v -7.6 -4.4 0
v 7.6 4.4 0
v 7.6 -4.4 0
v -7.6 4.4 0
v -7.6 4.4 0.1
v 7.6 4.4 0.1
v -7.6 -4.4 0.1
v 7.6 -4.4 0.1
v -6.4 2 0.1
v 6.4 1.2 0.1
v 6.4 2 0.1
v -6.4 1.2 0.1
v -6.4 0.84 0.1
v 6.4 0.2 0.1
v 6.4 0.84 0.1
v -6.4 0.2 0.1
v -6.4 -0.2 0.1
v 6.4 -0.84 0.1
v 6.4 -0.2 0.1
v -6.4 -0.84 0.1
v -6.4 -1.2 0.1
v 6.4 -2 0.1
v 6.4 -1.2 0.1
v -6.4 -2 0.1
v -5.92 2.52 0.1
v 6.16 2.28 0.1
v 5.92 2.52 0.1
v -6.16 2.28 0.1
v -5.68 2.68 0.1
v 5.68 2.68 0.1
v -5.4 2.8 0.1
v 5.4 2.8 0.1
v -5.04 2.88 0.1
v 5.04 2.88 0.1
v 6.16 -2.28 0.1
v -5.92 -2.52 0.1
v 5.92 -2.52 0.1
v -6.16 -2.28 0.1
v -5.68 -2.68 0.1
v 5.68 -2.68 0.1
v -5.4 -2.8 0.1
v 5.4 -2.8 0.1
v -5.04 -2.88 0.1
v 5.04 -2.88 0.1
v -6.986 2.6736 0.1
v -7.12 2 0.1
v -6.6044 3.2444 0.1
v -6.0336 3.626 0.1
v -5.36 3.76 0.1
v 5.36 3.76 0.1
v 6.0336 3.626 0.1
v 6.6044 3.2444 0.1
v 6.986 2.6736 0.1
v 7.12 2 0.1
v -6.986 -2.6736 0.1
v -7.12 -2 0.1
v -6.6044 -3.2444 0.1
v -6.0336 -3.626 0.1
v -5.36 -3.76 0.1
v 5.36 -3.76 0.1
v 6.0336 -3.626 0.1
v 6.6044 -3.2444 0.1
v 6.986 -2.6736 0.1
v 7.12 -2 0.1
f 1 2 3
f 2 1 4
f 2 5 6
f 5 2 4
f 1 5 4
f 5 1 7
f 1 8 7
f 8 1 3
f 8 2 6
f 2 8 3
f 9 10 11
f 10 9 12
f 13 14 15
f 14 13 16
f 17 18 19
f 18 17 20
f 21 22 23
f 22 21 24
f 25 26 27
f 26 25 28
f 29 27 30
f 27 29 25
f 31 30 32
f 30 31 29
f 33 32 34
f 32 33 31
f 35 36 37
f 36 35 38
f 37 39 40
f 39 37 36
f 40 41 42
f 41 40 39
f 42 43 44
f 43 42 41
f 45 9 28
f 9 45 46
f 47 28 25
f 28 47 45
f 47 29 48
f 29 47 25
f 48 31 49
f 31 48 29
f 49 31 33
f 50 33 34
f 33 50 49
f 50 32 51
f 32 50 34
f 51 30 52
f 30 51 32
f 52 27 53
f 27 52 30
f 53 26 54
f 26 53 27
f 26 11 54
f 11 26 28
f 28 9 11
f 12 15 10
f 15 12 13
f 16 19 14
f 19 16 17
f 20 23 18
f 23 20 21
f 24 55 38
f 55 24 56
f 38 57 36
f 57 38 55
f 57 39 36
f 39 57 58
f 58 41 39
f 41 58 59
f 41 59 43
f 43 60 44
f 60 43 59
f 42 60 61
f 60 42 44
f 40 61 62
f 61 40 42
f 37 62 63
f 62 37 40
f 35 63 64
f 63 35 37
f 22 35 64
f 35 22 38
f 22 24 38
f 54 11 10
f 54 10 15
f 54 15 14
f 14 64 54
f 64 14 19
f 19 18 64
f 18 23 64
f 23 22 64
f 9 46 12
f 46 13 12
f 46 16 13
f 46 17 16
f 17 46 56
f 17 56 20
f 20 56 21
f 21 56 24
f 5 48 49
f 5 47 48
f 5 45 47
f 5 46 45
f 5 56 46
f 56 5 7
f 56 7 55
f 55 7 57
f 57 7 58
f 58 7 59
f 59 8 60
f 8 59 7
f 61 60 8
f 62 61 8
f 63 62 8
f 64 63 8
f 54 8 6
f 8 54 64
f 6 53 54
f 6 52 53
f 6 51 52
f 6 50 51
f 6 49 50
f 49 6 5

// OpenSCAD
// file: ../p/box5-12.scad
use <../lib.scad>
function ldraw_lib__box5_12() = [
// 0 Box with 5 Faces without Any Edges
// 0 Name: box5-12.dat
// 0 Author: Chris Dee [cwdee]
// 0 !LDRAW_ORG Primitive UPDATE 2009-02
// 0 !LICENSE Licensed under CC BY 4.0 : see CAreadme.txt
// 
// 0 BFC CERTIFY CCW
  [0,"BFC","CERTIFY"],
  [0,"BFC","CCW"],
// 
// 0 !HISTORY 2009-09-03 [PTadmin] Official Update 2009-02
// 
// 
// 4 16 1 1 1 1 1 -1 -1 1 -1 -1 1 1
  [4,16,1,1,1,1,1,-1,-1,1,-1,-1,1,1],
// 4 16 -1 0 1 1 0 1 1 1 1 -1 1 1
  [4,16,-1,0,1,1,0,1,1,1,1,-1,1,1],
// 4 16 -1 0 -1 -1 0 1 -1 1 1 -1 1 -1
  [4,16,-1,0,-1,-1,0,1,-1,1,1,-1,1,-1],
// 4 16 1 0 -1 -1 0 -1 -1 1 -1 1 1 -1
  [4,16,1,0,-1,-1,0,-1,-1,1,-1,1,1,-1],
// 4 16 1 0 1 1 0 -1 1 1 -1 1 1 1
  [4,16,1,0,1,1,0,-1,1,1,-1,1,1,1],
// 0
];
module ldraw_lib__box5_12(step=0, col=false, unit=2/5, alt=false, line=0.2, solid=!$preview)
    makepoly(ldraw_lib__box5_12(), step=step, col=col, unit=unit, alt=alt, line=line, solid=solid);
ldraw_lib__box5_12(line=0.2);
// main file
use <../lib.scad>
use <../p/box5-12.scad>
function ldraw_lib__4100418e() = [
// 0 Sticker  1.1 x  1.9 with Horizontal Grille
// 0 Name: 4100418e.dat
// 0 Author: J.C. Tchang [tchang]
// 0 !LDRAW_ORG Part UPDATE 2013-01
// 0 !LICENSE Licensed under CC BY 4.0 : see CAreadme.txt
// 
// 0 BFC CERTIFY CCW
  [0,"BFC","CERTIFY"],
  [0,"BFC","CCW"],
// 
// 0 !KEYWORDS Set 5571
// 
// 0 !HISTORY 2013-07-21 [PTadmin] Official Update 2013-01
// 
// 
// 1 16 0 -0.25 0 19 0 0 0 0.25 0 0 0 11 box5-12.dat
  [1,16,0,-0.25,0,19,0,0,0,0.25,0,0,0,11, ldraw_lib__box5_12()],
// 0 //
// 4 0 16 -0.25 5 -16 -0.25 5 -16 -0.25 3 16 -0.25 3
  [4,0,16,-0.25,5,-16,-0.25,5,-16,-0.25,3,16,-0.25,3],
// 4 0 16 -0.25 2.1 -16 -0.25 2.1 -16 -0.25 0.5 16 -0.25 0.5
  [4,0,16,-0.25,2.1,-16,-0.25,2.1,-16,-0.25,0.5,16,-0.25,0.5],
// 4 0 16 -0.25 -0.5 -16 -0.25 -0.5 -16 -0.25 -2.1 16 -0.25 -2.1
  [4,0,16,-0.25,-0.5,-16,-0.25,-0.5,-16,-0.25,-2.1,16,-0.25,-2.1],
// 4 0 16 -0.25 -3 -16 -0.25 -3 -16 -0.25 -5 16 -0.25 -5
  [4,0,16,-0.25,-3,-16,-0.25,-3,-16,-0.25,-5,16,-0.25,-5],
// 4 0 -14.8 -0.25 6.3 -15.4 -0.25 5.7 15.4 -0.25 5.7 14.8 -0.25 6.3
  [4,0,-14.8,-0.25,6.3,-15.4,-0.25,5.7,15.4,-0.25,5.7,14.8,-0.25,6.3],
// 4 0 -14.2 -0.25 6.7 -14.8 -0.25 6.3 14.8 -0.25 6.3 14.2 -0.25 6.7
  [4,0,-14.2,-0.25,6.7,-14.8,-0.25,6.3,14.8,-0.25,6.3,14.2,-0.25,6.7],
// 4 0 -13.5 -0.25 7 -14.2 -0.25 6.7 14.2 -0.25 6.7 13.5 -0.25 7
  [4,0,-13.5,-0.25,7,-14.2,-0.25,6.7,14.2,-0.25,6.7,13.5,-0.25,7],
// 4 0 -12.6 -0.25 7.2 -13.5 -0.25 7 13.5 -0.25 7 12.6 -0.25 7.2
  [4,0,-12.6,-0.25,7.2,-13.5,-0.25,7,13.5,-0.25,7,12.6,-0.25,7.2],
// 4 0 14.8 -0.25 -6.3 15.4 -0.25 -5.7 -15.4 -0.25 -5.7 -14.8 -0.25 -6.3
  [4,0,14.8,-0.25,-6.3,15.4,-0.25,-5.7,-15.4,-0.25,-5.7,-14.8,-0.25,-6.3],
// 4 0 14.2 -0.25 -6.7 14.8 -0.25 -6.3 -14.8 -0.25 -6.3 -14.2 -0.25 -6.7
  [4,0,14.2,-0.25,-6.7,14.8,-0.25,-6.3,-14.8,-0.25,-6.3,-14.2,-0.25,-6.7],
// 4 0 13.5 -0.25 -7 14.2 -0.25 -6.7 -14.2 -0.25 -6.7 -13.5 -0.25 -7
  [4,0,13.5,-0.25,-7,14.2,-0.25,-6.7,-14.2,-0.25,-6.7,-13.5,-0.25,-7],
// 4 0 12.6 -0.25 -7.2 13.5 -0.25 -7 -13.5 -0.25 -7 -12.6 -0.25 -7.2
  [4,0,12.6,-0.25,-7.2,13.5,-0.25,-7,-13.5,-0.25,-7,-12.6,-0.25,-7.2],
// 0 //
// 4 7 -17.465 -0.25 6.684 -17.8 -0.25 5 -16 -0.25 5 -15.4 -0.25 5.7
  [4,7,-17.465,-0.25,6.684,-17.8,-0.25,5,-16,-0.25,5,-15.4,-0.25,5.7],
// 4 7 -16.511 -0.25 8.111 -17.465 -0.25 6.684 -15.4 -0.25 5.7 -14.8 -0.25 6.3
  [4,7,-16.511,-0.25,8.111,-17.465,-0.25,6.684,-15.4,-0.25,5.7,-14.8,-0.25,6.3],
// 4 7 -15.084 -0.25 9.065 -16.511 -0.25 8.111 -14.8 -0.25 6.3 -14.2 -0.25 6.7
  [4,7,-15.084,-0.25,9.065,-16.511,-0.25,8.111,-14.8,-0.25,6.3,-14.2,-0.25,6.7],
// 4 7 -13.4 -0.25 9.4 -15.084 -0.25 9.065 -14.2 -0.25 6.7 -13.5 -0.25 7
  [4,7,-13.4,-0.25,9.4,-15.084,-0.25,9.065,-14.2,-0.25,6.7,-13.5,-0.25,7],
// 3 7 -13.4 -0.25 9.4 -13.5 -0.25 7 -12.6 -0.25 7.2
  [3,7,-13.4,-0.25,9.4,-13.5,-0.25,7,-12.6,-0.25,7.2],
// 4 7 -13.4 -0.25 9.4 -12.6 -0.25 7.2 12.6 -0.25 7.2 13.4 -0.25 9.4
  [4,7,-13.4,-0.25,9.4,-12.6,-0.25,7.2,12.6,-0.25,7.2,13.4,-0.25,9.4],
// 4 7 13.4 -0.25 9.4 12.6 -0.25 7.2 13.5 -0.25 7 15.084 -0.25 9.065
  [4,7,13.4,-0.25,9.4,12.6,-0.25,7.2,13.5,-0.25,7,15.084,-0.25,9.065],
// 4 7 15.084 -0.25 9.065 13.5 -0.25 7 14.2 -0.25 6.7 16.511 -0.25 8.111
  [4,7,15.084,-0.25,9.065,13.5,-0.25,7,14.2,-0.25,6.7,16.511,-0.25,8.111],
// 4 7 16.511 -0.25 8.111 14.2 -0.25 6.7 14.8 -0.25 6.3 17.465 -0.25 6.684
  [4,7,16.511,-0.25,8.111,14.2,-0.25,6.7,14.8,-0.25,6.3,17.465,-0.25,6.684],
// 4 7 17.465 -0.25 6.684 14.8 -0.25 6.3 15.4 -0.25 5.7 17.8 -0.25 5
  [4,7,17.465,-0.25,6.684,14.8,-0.25,6.3,15.4,-0.25,5.7,17.8,-0.25,5],
// 4 7 16 -0.25 5 17.8 -0.25 5 15.4 -0.25 5.7 -15.4 -0.25 5.7
  [4,7,16,-0.25,5,17.8,-0.25,5,15.4,-0.25,5.7,-15.4,-0.25,5.7],
// 3 7 -15.4 -0.25 5.7 -16 -0.25 5 16 -0.25 5
  [3,7,-15.4,-0.25,5.7,-16,-0.25,5,16,-0.25,5],
// 4 7 16 -0.25 3 -16 -0.25 3 -16 -0.25 2.1 16 -0.25 2.1
  [4,7,16,-0.25,3,-16,-0.25,3,-16,-0.25,2.1,16,-0.25,2.1],
// 4 7 16 -0.25 0.5 -16 -0.25 0.5 -16 -0.25 -0.5 16 -0.25 -0.5
  [4,7,16,-0.25,0.5,-16,-0.25,0.5,-16,-0.25,-0.5,16,-0.25,-0.5],
// 4 7 16 -0.25 -2.1 -16 -0.25 -2.1 -16 -0.25 -3 16 -0.25 -3
  [4,7,16,-0.25,-2.1,-16,-0.25,-2.1,-16,-0.25,-3,16,-0.25,-3],
// 4 7 -16 -0.25 -5 -17.8 -0.25 -5 -17.465 -0.25 -6.684 -15.4 -0.25 -5.7
  [4,7,-16,-0.25,-5,-17.8,-0.25,-5,-17.465,-0.25,-6.684,-15.4,-0.25,-5.7],
// 4 7 -15.4 -0.25 -5.7 -17.465 -0.25 -6.684 -16.511 -0.25 -8.111 -14.8 -0.25 -6.3
  [4,7,-15.4,-0.25,-5.7,-17.465,-0.25,-6.684,-16.511,-0.25,-8.111,-14.8,-0.25,-6.3],
// 4 7 -14.8 -0.25 -6.3 -16.511 -0.25 -8.111 -15.084 -0.25 -9.065 -14.2 -0.25 -6.7
  [4,7,-14.8,-0.25,-6.3,-16.511,-0.25,-8.111,-15.084,-0.25,-9.065,-14.2,-0.25,-6.7],
// 4 7 -14.2 -0.25 -6.7 -15.084 -0.25 -9.065 -13.4 -0.25 -9.4 -13.5 -0.25 -7
  [4,7,-14.2,-0.25,-6.7,-15.084,-0.25,-9.065,-13.4,-0.25,-9.4,-13.5,-0.25,-7],
// 3 7 -13.5 -0.25 -7 -13.4 -0.25 -9.4 -12.6 -0.25 -7.2
  [3,7,-13.5,-0.25,-7,-13.4,-0.25,-9.4,-12.6,-0.25,-7.2],
// 4 7 -12.6 -0.25 -7.2 -13.4 -0.25 -9.4 13.4 -0.25 -9.4 12.6 -0.25 -7.2
  [4,7,-12.6,-0.25,-7.2,-13.4,-0.25,-9.4,13.4,-0.25,-9.4,12.6,-0.25,-7.2],
// 4 7 12.6 -0.25 -7.2 13.4 -0.25 -9.4 15.084 -0.25 -9.065 13.5 -0.25 -7
  [4,7,12.6,-0.25,-7.2,13.4,-0.25,-9.4,15.084,-0.25,-9.065,13.5,-0.25,-7],
// 4 7 13.5 -0.25 -7 15.084 -0.25 -9.065 16.511 -0.25 -8.111 14.2 -0.25 -6.7
  [4,7,13.5,-0.25,-7,15.084,-0.25,-9.065,16.511,-0.25,-8.111,14.2,-0.25,-6.7],
// 4 7 14.2 -0.25 -6.7 16.511 -0.25 -8.111 17.465 -0.25 -6.684 14.8 -0.25 -6.3
  [4,7,14.2,-0.25,-6.7,16.511,-0.25,-8.111,17.465,-0.25,-6.684,14.8,-0.25,-6.3],
// 4 7 14.8 -0.25 -6.3 17.465 -0.25 -6.684 17.8 -0.25 -5 15.4 -0.25 -5.7
  [4,7,14.8,-0.25,-6.3,17.465,-0.25,-6.684,17.8,-0.25,-5,15.4,-0.25,-5.7],
// 4 7 15.4 -0.25 -5.7 17.8 -0.25 -5 16 -0.25 -5 -15.4 -0.25 -5.7
  [4,7,15.4,-0.25,-5.7,17.8,-0.25,-5,16,-0.25,-5,-15.4,-0.25,-5.7],
// 3 7 16 -0.25 -5 -16 -0.25 -5 -15.4 -0.25 -5.7
  [3,7,16,-0.25,-5,-16,-0.25,-5,-15.4,-0.25,-5.7],
// 3 7 17.8 -0.25 5 16 -0.25 5 16 -0.25 3
  [3,7,17.8,-0.25,5,16,-0.25,5,16,-0.25,3],
// 3 7 17.8 -0.25 5 16 -0.25 3 16 -0.25 2.1
  [3,7,17.8,-0.25,5,16,-0.25,3,16,-0.25,2.1],
// 3 7 17.8 -0.25 5 16 -0.25 2.1 16 -0.25 0.5
  [3,7,17.8,-0.25,5,16,-0.25,2.1,16,-0.25,0.5],
// 4 7 17.8 -0.25 5 16 -0.25 0.5 16 -0.25 -0.5 17.8 -0.25 -5
  [4,7,17.8,-0.25,5,16,-0.25,0.5,16,-0.25,-0.5,17.8,-0.25,-5],
// 3 7 16 -0.25 -0.5 16 -0.25 -2.1 17.8 -0.25 -5
  [3,7,16,-0.25,-0.5,16,-0.25,-2.1,17.8,-0.25,-5],
// 3 7 16 -0.25 -2.1 16 -0.25 -3 17.8 -0.25 -5
  [3,7,16,-0.25,-2.1,16,-0.25,-3,17.8,-0.25,-5],
// 3 7 16 -0.25 -3 16 -0.25 -5 17.8 -0.25 -5
  [3,7,16,-0.25,-3,16,-0.25,-5,17.8,-0.25,-5],
// 3 7 -16 -0.25 5 -17.8 -0.25 5 -16 -0.25 3
  [3,7,-16,-0.25,5,-17.8,-0.25,5,-16,-0.25,3],
// 3 7 -17.8 -0.25 5 -16 -0.25 2.1 -16 -0.25 3
  [3,7,-17.8,-0.25,5,-16,-0.25,2.1,-16,-0.25,3],
// 3 7 -17.8 -0.25 5 -16 -0.25 0.5 -16 -0.25 2.1
  [3,7,-17.8,-0.25,5,-16,-0.25,0.5,-16,-0.25,2.1],
// 4 7 -16 -0.25 -0.5 -16 -0.25 0.5 -17.8 -0.25 5 -17.8 -0.25 -5
  [4,7,-16,-0.25,-0.5,-16,-0.25,0.5,-17.8,-0.25,5,-17.8,-0.25,-5],
// 3 7 -16 -0.25 -0.5 -17.8 -0.25 -5 -16 -0.25 -2.1
  [3,7,-16,-0.25,-0.5,-17.8,-0.25,-5,-16,-0.25,-2.1],
// 3 7 -16 -0.25 -2.1 -17.8 -0.25 -5 -16 -0.25 -3
  [3,7,-16,-0.25,-2.1,-17.8,-0.25,-5,-16,-0.25,-3],
// 3 7 -16 -0.25 -3 -17.8 -0.25 -5 -16 -0.25 -5
  [3,7,-16,-0.25,-3,-17.8,-0.25,-5,-16,-0.25,-5],
// 0 //
// 3 16 -19 -0.25 11 -15.084 -0.25 9.065 -13.4 -0.25 9.4
  [3,16,-19,-0.25,11,-15.084,-0.25,9.065,-13.4,-0.25,9.4],
// 3 16 -19 -0.25 11 -16.511 -0.25 8.111 -15.084 -0.25 9.065
  [3,16,-19,-0.25,11,-16.511,-0.25,8.111,-15.084,-0.25,9.065],
// 3 16 -19 -0.25 11 -17.465 -0.25 6.684 -16.511 -0.25 8.111
  [3,16,-19,-0.25,11,-17.465,-0.25,6.684,-16.511,-0.25,8.111],
// 3 16 -19 -0.25 11 -17.8 -0.25 5 -17.465 -0.25 6.684
  [3,16,-19,-0.25,11,-17.8,-0.25,5,-17.465,-0.25,6.684],
// 4 16 -17.8 -0.25 -5 -17.8 -0.25 5 -19 -0.25 11 -19 -0.25 -11
  [4,16,-17.8,-0.25,-5,-17.8,-0.25,5,-19,-0.25,11,-19,-0.25,-11],
// 3 16 -17.8 -0.25 -5 -19 -0.25 -11 -17.465 -0.25 -6.684
  [3,16,-17.8,-0.25,-5,-19,-0.25,-11,-17.465,-0.25,-6.684],
// 3 16 -17.465 -0.25 -6.684 -19 -0.25 -11 -16.511 -0.25 -8.111
  [3,16,-17.465,-0.25,-6.684,-19,-0.25,-11,-16.511,-0.25,-8.111],
// 3 16 -16.511 -0.25 -8.111 -19 -0.25 -11 -15.084 -0.25 -9.065
  [3,16,-16.511,-0.25,-8.111,-19,-0.25,-11,-15.084,-0.25,-9.065],
// 3 16 -15.084 -0.25 -9.065 -19 -0.25 -11 -13.4 -0.25 -9.4
  [3,16,-15.084,-0.25,-9.065,-19,-0.25,-11,-13.4,-0.25,-9.4],
// 4 16 13.4 -0.25 -9.4 -13.4 -0.25 -9.4 -19 -0.25 -11 19 -0.25 -11
  [4,16,13.4,-0.25,-9.4,-13.4,-0.25,-9.4,-19,-0.25,-11,19,-0.25,-11],
// 3 16 15.084 -0.25 -9.065 13.4 -0.25 -9.4 19 -0.25 -11
  [3,16,15.084,-0.25,-9.065,13.4,-0.25,-9.4,19,-0.25,-11],
// 3 16 16.511 -0.25 -8.111 15.084 -0.25 -9.065 19 -0.25 -11
  [3,16,16.511,-0.25,-8.111,15.084,-0.25,-9.065,19,-0.25,-11],
// 3 16 17.465 -0.25 -6.684 16.511 -0.25 -8.111 19 -0.25 -11
  [3,16,17.465,-0.25,-6.684,16.511,-0.25,-8.111,19,-0.25,-11],
// 3 16 17.8 -0.25 -5 17.465 -0.25 -6.684 19 -0.25 -11
  [3,16,17.8,-0.25,-5,17.465,-0.25,-6.684,19,-0.25,-11],
// 4 16 17.8 -0.25 5 17.8 -0.25 -5 19 -0.25 -11 19 -0.25 11
  [4,16,17.8,-0.25,5,17.8,-0.25,-5,19,-0.25,-11,19,-0.25,11],
// 3 16 19 -0.25 11 17.465 -0.25 6.684 17.8 -0.25 5
  [3,16,19,-0.25,11,17.465,-0.25,6.684,17.8,-0.25,5],
// 3 16 19 -0.25 11 16.511 -0.25 8.111 17.465 -0.25 6.684
  [3,16,19,-0.25,11,16.511,-0.25,8.111,17.465,-0.25,6.684],
// 3 16 19 -0.25 11 15.084 -0.25 9.065 16.511 -0.25 8.111
  [3,16,19,-0.25,11,15.084,-0.25,9.065,16.511,-0.25,8.111],
// 3 16 19 -0.25 11 13.4 -0.25 9.4 15.084 -0.25 9.065
  [3,16,19,-0.25,11,13.4,-0.25,9.4,15.084,-0.25,9.065],
// 4 16 -13.4 -0.25 9.4 13.4 -0.25 9.4 19 -0.25 11 -19 -0.25 11
  [4,16,-13.4,-0.25,9.4,13.4,-0.25,9.4,19,-0.25,11,-19,-0.25,11],
];
module ldraw_lib__4100418e(step=0, col=false, unit=2/5, alt=false, line=0.2, solid=!$preview)
    makepoly(ldraw_lib__4100418e(), step=step, col=col, unit=unit, alt=alt, line=line, solid=solid);
ldraw_lib__4100418e(line=0.2);
